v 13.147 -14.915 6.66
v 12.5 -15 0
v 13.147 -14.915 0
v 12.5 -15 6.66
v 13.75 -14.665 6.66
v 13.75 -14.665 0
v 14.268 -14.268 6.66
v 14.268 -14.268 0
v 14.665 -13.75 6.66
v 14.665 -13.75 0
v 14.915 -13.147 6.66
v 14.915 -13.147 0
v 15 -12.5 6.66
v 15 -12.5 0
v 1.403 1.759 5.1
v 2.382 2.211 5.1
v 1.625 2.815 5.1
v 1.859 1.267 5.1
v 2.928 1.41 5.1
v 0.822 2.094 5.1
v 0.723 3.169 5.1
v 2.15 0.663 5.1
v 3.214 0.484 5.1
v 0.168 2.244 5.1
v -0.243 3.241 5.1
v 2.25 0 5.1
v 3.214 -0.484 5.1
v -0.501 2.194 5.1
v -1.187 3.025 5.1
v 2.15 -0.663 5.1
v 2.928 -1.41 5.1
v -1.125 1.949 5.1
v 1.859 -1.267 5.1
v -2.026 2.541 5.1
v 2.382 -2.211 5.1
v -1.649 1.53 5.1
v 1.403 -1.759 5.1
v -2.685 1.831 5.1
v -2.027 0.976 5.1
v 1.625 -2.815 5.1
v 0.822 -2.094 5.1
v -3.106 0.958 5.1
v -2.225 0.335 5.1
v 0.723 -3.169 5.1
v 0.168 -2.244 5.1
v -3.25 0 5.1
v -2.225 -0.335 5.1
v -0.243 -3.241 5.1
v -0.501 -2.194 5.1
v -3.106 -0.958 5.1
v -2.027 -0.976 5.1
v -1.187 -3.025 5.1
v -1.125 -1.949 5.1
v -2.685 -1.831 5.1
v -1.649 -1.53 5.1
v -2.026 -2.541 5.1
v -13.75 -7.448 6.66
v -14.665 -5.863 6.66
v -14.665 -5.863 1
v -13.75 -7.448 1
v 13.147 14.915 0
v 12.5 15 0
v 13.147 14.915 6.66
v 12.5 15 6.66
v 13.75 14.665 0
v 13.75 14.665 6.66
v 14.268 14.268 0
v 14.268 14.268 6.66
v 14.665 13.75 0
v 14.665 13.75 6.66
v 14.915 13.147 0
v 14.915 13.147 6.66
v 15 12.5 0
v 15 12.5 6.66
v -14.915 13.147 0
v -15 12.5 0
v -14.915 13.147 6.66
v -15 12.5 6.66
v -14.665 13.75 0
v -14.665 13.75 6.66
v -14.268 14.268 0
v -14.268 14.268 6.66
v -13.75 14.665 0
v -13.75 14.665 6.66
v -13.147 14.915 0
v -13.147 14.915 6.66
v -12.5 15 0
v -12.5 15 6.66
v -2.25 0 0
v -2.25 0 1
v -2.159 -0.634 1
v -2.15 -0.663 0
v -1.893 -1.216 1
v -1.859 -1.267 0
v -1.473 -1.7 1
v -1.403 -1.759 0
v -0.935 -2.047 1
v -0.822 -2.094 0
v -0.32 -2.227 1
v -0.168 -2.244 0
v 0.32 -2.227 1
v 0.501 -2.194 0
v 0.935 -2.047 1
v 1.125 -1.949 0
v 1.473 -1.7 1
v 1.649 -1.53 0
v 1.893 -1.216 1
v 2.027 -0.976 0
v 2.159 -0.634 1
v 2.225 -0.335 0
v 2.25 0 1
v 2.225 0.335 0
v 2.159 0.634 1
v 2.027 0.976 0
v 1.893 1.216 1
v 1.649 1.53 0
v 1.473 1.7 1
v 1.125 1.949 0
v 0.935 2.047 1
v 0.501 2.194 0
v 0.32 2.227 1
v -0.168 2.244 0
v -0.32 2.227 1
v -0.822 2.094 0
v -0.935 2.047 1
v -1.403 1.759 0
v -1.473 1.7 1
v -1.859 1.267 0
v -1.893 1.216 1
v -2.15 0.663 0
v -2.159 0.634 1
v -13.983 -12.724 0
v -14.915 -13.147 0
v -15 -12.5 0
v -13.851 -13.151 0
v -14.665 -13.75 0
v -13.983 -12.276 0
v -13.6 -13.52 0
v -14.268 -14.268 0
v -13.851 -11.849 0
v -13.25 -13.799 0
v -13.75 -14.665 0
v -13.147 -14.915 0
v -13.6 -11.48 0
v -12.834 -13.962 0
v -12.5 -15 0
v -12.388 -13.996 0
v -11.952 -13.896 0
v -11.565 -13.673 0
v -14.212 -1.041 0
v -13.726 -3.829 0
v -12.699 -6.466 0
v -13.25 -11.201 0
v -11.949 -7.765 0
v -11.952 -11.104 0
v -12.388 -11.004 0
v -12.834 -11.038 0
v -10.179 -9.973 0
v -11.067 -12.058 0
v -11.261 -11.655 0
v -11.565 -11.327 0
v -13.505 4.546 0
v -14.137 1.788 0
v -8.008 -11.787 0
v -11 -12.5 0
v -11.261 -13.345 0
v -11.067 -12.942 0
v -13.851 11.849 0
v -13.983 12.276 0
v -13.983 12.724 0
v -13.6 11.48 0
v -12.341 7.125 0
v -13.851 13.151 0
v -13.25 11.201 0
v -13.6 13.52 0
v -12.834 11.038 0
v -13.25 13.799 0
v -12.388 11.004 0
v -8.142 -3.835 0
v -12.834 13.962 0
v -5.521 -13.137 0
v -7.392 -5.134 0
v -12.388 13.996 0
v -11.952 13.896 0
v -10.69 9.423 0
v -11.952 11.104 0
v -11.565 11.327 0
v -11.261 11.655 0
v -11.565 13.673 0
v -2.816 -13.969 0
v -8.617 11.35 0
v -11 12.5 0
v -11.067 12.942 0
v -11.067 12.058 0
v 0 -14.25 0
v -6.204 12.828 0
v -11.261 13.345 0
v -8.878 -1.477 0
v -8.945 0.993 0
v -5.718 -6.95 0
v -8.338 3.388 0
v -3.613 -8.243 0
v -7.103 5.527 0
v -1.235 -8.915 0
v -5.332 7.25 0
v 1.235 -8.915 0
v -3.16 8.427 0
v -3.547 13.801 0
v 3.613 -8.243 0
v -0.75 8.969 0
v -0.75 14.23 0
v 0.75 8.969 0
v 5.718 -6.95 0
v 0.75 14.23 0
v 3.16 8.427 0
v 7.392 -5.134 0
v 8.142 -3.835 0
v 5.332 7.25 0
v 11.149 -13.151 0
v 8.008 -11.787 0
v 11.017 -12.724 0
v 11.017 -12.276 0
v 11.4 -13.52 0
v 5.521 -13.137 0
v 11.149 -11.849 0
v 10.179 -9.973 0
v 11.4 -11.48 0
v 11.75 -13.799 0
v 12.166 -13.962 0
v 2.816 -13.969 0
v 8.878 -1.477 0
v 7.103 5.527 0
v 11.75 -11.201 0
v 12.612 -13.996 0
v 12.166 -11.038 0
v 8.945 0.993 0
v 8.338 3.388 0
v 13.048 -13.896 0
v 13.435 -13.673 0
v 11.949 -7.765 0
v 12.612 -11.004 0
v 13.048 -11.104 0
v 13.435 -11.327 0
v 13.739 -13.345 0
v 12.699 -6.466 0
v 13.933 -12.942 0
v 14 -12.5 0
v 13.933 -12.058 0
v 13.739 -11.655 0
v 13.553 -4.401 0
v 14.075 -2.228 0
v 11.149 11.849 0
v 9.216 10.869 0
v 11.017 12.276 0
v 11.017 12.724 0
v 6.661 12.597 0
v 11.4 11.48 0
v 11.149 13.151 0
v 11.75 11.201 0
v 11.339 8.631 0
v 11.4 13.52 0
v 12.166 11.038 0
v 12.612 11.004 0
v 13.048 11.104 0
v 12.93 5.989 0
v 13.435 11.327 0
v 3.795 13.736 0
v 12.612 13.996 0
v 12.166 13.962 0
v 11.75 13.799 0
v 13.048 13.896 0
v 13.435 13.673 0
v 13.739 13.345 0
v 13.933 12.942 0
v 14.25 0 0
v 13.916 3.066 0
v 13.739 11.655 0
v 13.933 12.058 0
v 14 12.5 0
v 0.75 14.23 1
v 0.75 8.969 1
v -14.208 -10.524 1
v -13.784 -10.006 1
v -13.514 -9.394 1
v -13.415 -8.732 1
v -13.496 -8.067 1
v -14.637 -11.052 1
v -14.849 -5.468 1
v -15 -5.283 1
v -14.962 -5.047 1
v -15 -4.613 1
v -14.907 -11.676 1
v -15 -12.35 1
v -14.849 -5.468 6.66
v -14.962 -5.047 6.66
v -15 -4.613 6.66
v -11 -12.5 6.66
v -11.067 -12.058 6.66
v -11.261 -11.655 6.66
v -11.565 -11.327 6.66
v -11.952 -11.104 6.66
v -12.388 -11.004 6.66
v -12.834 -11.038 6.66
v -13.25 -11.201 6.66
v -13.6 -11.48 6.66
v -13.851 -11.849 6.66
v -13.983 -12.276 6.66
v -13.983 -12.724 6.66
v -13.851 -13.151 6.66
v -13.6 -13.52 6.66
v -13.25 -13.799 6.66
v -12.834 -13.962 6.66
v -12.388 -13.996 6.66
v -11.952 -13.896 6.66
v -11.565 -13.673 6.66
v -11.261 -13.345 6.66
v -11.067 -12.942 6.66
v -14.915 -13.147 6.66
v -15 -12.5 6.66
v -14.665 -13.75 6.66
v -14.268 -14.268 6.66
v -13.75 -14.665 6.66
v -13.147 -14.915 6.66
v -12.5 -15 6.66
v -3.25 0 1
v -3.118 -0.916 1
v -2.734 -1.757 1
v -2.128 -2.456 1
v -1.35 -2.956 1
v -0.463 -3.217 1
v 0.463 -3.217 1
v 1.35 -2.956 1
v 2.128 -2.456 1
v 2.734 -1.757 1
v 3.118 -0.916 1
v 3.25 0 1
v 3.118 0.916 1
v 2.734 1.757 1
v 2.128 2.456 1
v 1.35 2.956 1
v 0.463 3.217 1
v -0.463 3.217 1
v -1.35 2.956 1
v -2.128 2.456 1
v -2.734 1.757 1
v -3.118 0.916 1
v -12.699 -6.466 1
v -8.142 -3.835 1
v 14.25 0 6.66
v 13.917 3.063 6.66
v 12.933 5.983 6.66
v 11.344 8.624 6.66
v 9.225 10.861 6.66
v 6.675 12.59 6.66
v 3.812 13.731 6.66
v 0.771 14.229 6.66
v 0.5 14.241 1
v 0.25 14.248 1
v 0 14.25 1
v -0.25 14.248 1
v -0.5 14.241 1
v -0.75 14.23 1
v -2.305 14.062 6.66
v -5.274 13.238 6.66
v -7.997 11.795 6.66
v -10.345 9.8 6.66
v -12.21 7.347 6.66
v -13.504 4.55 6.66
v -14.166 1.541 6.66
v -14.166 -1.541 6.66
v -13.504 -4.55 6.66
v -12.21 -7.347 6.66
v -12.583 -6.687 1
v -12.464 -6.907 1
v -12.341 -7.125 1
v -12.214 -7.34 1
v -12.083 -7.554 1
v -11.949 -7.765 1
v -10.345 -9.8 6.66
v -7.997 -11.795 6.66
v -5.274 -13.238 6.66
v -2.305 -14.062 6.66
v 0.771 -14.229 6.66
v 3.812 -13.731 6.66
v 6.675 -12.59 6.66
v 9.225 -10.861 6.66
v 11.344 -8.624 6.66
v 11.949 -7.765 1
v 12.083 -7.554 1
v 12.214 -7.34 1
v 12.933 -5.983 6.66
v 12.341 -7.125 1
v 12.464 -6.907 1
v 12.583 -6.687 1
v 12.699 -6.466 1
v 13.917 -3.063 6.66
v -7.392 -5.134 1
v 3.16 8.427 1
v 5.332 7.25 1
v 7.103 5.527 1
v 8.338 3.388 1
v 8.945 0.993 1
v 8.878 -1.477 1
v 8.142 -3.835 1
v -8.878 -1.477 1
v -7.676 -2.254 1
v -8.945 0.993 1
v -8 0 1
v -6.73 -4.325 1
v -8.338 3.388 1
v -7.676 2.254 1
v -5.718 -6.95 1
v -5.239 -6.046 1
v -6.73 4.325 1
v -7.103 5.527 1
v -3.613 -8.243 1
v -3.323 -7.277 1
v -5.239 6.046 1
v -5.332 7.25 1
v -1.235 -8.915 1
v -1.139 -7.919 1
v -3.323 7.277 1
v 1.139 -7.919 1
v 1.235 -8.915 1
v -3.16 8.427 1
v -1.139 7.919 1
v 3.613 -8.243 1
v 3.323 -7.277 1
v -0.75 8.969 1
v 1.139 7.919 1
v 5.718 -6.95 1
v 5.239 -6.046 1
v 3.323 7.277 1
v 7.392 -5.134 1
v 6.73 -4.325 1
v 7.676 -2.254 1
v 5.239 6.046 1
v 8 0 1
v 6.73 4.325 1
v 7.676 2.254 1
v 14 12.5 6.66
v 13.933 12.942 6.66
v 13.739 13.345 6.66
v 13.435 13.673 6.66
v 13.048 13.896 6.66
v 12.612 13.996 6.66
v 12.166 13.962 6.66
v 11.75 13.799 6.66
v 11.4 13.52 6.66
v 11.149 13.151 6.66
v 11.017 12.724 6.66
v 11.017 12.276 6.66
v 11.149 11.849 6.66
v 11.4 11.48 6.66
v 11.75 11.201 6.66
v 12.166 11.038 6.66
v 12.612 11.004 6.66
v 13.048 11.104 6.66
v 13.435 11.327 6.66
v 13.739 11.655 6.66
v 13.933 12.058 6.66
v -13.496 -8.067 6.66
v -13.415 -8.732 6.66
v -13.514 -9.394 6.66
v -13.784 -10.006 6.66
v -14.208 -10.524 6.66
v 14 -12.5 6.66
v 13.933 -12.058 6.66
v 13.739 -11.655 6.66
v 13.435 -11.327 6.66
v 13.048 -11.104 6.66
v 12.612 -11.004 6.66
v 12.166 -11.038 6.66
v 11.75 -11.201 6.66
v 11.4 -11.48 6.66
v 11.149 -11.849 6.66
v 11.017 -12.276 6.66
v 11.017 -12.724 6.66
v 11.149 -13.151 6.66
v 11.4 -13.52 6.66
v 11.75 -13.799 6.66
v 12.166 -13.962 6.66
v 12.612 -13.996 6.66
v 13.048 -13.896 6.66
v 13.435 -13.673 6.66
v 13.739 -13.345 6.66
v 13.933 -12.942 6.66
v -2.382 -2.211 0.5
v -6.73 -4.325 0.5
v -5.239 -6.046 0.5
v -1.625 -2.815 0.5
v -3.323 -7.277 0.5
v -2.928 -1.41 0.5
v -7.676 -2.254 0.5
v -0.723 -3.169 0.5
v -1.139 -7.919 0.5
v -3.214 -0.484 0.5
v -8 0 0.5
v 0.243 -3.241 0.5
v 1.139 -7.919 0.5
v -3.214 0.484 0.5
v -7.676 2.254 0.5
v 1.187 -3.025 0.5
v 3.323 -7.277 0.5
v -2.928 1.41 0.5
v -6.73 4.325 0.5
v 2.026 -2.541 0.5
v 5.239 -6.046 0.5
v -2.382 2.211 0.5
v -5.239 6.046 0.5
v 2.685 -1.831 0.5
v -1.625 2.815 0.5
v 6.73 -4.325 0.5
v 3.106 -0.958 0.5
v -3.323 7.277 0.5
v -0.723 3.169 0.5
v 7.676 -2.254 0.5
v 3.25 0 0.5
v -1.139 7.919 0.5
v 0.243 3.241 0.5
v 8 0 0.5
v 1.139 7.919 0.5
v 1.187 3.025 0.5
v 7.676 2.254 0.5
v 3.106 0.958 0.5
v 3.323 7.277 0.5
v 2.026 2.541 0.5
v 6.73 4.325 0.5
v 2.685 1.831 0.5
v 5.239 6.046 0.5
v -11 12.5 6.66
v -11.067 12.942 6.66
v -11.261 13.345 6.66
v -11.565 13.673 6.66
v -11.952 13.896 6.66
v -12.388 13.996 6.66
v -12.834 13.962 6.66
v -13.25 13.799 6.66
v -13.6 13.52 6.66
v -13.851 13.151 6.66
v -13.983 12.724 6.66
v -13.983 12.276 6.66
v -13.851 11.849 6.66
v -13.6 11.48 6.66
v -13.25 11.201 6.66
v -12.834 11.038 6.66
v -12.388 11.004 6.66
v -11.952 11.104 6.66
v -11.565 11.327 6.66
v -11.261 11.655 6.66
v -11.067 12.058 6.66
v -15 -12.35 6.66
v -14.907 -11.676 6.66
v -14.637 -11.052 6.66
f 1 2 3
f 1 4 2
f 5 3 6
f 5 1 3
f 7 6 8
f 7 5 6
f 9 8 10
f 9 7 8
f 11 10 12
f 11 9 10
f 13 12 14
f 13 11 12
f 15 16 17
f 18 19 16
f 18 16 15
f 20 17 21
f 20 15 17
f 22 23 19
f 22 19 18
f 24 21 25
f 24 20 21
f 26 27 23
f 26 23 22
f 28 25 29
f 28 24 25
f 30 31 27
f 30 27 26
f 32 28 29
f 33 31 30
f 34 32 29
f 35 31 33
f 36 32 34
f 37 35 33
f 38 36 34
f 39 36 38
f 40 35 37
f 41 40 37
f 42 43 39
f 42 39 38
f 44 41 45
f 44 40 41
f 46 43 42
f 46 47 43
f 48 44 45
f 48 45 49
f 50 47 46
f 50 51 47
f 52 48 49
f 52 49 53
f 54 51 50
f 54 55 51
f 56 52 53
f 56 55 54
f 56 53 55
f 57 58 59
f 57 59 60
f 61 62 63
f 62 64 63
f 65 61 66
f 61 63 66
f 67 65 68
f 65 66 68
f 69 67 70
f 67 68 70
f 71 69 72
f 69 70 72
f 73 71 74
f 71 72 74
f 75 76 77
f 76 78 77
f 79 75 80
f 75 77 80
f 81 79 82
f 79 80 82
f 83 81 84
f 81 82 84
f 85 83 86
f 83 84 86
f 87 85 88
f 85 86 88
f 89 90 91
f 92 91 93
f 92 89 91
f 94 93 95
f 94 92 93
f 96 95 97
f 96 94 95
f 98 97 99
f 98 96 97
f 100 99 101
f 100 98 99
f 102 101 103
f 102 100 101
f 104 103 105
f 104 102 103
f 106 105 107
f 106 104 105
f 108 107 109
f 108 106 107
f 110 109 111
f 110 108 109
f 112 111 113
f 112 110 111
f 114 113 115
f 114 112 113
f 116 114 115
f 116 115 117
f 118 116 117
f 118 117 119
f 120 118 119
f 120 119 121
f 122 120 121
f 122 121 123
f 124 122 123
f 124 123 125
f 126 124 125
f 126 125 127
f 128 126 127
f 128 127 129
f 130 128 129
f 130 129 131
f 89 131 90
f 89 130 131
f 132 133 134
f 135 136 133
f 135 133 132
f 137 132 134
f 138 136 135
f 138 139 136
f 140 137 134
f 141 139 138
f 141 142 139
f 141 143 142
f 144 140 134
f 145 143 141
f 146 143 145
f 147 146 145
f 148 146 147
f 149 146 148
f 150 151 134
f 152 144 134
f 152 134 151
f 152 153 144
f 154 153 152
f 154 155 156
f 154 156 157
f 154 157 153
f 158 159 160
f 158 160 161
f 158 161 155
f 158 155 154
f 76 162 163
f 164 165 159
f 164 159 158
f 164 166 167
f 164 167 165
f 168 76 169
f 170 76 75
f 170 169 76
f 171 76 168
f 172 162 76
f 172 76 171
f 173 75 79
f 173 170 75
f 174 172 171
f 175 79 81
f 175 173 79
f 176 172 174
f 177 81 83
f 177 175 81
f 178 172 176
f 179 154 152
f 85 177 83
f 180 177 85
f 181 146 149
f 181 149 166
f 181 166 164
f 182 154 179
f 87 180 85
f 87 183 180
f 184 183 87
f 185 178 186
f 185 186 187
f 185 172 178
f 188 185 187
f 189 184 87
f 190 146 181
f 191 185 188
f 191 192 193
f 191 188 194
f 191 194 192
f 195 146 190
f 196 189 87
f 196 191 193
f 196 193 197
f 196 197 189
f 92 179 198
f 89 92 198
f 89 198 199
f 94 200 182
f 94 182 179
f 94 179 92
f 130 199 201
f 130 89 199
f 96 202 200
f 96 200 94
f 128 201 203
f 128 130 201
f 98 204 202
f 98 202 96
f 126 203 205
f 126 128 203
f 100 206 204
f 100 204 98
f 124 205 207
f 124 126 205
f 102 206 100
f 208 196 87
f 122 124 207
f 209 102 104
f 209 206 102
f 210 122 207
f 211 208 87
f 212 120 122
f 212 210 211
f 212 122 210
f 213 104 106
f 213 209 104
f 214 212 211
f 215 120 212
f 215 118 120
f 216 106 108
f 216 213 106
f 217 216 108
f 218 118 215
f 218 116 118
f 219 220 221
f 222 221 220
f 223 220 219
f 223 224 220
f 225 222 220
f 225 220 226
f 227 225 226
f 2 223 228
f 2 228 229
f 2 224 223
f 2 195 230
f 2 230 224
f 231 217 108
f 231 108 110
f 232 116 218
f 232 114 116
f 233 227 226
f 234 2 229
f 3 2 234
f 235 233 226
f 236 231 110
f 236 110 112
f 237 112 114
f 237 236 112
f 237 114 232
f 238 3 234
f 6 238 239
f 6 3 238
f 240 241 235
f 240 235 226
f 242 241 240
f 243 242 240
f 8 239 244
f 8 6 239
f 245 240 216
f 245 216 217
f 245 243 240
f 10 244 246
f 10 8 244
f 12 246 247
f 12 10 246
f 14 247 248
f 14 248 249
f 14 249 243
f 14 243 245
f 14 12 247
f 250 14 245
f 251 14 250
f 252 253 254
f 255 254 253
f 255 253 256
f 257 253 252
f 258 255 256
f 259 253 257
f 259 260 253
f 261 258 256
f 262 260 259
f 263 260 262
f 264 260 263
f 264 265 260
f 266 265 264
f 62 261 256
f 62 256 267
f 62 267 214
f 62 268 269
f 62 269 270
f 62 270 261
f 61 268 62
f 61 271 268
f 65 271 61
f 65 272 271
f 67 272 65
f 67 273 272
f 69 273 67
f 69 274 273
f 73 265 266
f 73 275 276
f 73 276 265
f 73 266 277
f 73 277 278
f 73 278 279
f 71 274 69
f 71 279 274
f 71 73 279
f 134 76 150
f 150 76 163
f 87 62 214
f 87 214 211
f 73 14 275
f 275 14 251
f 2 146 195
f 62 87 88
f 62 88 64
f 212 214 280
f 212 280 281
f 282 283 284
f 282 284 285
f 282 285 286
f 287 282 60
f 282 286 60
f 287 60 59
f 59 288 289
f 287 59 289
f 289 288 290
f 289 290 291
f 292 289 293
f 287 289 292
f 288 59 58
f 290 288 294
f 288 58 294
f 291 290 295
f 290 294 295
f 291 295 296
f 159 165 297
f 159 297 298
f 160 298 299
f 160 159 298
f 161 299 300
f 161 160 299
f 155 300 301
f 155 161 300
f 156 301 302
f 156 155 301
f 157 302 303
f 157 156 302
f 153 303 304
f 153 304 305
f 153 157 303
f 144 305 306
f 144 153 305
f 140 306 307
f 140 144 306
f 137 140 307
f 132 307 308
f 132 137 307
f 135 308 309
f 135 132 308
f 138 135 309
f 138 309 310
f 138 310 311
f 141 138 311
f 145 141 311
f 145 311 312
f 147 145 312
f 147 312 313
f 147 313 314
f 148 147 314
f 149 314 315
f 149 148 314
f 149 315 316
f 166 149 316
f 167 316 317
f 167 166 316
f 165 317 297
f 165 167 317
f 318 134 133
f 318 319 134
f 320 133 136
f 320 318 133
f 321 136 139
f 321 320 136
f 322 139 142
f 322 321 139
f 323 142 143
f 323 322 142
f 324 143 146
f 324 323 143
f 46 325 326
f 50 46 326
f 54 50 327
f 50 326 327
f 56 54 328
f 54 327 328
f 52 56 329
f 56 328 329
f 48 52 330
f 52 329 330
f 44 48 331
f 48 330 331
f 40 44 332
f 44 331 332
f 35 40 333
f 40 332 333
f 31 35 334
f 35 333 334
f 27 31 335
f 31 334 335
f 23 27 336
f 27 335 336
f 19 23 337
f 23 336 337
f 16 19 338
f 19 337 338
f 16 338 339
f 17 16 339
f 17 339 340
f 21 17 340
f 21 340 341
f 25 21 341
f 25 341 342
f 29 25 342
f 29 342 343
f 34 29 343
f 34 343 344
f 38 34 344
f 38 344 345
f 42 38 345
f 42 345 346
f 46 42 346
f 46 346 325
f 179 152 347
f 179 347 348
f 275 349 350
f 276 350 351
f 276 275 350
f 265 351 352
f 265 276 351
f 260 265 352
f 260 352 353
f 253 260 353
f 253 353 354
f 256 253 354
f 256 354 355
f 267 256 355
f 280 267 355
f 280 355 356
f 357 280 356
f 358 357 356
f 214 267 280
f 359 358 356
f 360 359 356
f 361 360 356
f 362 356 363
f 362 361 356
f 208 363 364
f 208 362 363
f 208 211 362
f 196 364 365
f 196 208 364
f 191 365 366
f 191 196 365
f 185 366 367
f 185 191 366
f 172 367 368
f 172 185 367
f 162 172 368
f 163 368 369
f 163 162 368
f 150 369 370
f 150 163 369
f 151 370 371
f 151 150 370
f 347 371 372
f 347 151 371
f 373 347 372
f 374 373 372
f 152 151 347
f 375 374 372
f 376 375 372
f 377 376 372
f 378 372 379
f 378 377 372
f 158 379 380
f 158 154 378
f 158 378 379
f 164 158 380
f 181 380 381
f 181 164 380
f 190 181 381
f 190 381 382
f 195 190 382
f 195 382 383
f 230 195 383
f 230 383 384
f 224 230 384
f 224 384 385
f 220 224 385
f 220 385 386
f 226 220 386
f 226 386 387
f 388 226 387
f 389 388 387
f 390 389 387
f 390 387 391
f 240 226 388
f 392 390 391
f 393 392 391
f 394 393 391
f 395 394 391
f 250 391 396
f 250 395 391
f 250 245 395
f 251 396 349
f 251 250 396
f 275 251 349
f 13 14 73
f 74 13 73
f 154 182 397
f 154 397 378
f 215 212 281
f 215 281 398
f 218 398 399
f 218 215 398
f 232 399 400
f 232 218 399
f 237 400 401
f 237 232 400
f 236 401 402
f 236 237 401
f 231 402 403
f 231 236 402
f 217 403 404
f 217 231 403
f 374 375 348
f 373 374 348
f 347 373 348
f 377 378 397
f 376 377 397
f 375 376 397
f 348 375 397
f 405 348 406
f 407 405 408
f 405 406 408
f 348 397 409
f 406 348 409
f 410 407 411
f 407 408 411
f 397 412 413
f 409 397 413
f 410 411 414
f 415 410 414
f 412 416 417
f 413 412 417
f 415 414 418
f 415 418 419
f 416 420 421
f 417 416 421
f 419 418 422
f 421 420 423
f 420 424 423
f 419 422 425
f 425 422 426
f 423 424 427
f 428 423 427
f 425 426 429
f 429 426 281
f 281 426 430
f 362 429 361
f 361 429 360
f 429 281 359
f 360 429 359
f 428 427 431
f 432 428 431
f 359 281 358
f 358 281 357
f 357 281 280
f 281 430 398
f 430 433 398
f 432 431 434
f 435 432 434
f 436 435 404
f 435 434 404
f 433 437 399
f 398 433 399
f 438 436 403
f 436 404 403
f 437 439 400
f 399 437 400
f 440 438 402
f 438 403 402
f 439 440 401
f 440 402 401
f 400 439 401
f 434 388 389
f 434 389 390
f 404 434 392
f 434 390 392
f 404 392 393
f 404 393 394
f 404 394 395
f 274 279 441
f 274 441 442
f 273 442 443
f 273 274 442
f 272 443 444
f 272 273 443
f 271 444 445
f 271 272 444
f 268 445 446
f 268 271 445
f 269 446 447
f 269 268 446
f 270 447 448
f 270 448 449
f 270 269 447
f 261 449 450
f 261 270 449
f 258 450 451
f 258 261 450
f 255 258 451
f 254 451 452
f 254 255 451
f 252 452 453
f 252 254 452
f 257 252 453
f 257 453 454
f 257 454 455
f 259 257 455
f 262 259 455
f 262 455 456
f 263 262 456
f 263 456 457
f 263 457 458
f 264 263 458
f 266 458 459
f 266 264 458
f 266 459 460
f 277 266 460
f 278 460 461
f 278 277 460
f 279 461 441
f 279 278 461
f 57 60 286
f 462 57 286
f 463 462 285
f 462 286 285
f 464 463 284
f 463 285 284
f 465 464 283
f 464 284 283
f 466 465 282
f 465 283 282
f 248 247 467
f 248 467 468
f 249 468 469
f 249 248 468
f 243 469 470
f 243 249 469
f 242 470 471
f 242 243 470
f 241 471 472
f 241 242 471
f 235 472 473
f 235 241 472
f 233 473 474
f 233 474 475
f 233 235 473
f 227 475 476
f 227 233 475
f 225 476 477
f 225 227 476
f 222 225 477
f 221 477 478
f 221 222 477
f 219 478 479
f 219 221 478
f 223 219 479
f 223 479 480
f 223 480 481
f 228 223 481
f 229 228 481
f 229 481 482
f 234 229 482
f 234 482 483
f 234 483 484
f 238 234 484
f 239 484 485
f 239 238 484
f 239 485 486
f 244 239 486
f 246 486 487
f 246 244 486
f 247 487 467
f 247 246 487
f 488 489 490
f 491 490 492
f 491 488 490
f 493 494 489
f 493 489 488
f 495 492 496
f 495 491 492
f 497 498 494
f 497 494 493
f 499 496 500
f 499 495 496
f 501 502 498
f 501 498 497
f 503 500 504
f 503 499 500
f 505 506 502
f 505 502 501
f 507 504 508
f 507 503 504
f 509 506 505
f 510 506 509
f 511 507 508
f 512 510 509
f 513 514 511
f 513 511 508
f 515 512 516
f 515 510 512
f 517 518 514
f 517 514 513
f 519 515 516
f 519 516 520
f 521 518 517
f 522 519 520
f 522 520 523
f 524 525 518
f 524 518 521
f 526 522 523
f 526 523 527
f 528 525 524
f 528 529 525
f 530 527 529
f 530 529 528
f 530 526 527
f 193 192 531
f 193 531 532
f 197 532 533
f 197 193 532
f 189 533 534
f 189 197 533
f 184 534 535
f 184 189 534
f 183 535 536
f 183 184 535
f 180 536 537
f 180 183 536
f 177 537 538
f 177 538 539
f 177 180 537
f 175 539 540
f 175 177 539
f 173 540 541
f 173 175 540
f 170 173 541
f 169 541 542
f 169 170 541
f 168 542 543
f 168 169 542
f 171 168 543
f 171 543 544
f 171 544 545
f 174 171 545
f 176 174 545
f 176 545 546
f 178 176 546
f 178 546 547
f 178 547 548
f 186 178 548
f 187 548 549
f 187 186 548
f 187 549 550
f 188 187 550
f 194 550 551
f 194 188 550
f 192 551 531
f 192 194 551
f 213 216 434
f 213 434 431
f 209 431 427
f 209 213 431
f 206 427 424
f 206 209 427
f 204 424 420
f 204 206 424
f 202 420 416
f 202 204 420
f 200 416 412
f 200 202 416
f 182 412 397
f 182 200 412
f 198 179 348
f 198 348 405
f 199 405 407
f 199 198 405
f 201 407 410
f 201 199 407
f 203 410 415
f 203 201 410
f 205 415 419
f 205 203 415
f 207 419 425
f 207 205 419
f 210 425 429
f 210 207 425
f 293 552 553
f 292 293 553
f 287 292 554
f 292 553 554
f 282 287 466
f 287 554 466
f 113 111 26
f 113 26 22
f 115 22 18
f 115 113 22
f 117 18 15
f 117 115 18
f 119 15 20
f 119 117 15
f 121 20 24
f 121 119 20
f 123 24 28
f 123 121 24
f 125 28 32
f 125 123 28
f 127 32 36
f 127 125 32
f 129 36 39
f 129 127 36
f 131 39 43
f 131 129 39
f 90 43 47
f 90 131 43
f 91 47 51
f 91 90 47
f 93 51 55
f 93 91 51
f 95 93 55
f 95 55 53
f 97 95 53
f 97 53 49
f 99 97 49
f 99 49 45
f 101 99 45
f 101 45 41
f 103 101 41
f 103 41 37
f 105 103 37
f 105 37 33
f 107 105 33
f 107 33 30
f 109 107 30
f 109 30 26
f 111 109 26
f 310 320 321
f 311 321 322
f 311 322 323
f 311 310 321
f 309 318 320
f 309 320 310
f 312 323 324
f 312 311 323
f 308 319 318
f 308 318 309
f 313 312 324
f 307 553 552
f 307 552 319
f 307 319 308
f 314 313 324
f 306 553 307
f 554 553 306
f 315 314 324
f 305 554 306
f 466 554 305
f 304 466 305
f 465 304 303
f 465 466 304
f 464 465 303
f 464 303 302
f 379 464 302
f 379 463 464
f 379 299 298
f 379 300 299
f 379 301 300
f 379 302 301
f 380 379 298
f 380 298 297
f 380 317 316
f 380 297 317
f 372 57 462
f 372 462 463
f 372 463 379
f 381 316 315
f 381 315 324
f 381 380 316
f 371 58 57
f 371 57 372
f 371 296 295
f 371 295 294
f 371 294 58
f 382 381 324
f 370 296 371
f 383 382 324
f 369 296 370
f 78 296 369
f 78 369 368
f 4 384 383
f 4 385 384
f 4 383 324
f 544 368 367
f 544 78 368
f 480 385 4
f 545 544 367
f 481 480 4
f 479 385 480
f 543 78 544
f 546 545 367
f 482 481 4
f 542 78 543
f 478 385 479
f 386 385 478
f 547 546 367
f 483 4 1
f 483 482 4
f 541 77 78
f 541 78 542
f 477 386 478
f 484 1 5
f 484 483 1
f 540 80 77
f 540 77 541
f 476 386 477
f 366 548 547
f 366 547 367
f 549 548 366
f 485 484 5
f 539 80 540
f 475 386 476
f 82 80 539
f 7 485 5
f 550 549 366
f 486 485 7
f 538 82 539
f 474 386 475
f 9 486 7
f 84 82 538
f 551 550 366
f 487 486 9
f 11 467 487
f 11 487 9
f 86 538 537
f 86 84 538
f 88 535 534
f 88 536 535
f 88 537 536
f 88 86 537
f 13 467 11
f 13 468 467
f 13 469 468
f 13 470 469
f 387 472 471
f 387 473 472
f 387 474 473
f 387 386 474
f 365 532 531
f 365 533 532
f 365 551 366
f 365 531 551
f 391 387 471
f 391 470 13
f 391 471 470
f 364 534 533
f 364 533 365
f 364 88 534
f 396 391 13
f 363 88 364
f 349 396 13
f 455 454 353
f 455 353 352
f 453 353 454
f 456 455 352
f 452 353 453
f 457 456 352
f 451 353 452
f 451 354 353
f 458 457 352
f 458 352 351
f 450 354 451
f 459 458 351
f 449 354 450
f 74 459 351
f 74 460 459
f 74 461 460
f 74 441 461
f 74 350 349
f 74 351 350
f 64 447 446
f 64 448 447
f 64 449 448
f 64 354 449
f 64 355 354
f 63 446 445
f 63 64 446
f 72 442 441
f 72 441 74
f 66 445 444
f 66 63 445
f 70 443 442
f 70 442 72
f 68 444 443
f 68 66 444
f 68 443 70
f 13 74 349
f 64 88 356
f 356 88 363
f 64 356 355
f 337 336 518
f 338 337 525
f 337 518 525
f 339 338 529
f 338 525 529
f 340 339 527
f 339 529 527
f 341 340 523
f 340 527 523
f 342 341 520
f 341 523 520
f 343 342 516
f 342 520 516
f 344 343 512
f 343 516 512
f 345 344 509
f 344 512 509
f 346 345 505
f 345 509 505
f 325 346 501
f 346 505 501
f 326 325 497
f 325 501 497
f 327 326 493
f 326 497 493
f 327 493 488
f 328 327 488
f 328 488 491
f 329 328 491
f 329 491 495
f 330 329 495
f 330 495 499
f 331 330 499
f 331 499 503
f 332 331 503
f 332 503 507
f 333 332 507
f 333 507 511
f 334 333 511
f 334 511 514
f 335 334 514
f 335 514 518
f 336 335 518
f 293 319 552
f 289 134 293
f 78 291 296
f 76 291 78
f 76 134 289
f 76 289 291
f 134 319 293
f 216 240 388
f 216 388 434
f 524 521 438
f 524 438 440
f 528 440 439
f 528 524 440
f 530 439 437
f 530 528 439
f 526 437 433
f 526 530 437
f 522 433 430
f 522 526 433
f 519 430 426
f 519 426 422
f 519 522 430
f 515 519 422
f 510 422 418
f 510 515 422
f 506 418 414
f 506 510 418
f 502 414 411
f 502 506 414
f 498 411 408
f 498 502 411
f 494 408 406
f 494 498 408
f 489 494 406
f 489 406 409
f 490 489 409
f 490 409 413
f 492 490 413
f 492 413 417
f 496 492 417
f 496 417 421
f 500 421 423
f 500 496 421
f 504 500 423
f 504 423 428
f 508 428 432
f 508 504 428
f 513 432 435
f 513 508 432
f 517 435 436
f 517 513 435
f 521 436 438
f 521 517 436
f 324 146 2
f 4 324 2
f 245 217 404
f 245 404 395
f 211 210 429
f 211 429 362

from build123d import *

# Parameters (mm, degrees)
SKETCH1_W           = 30
SKETCH1_H           = 30
SKETCH1_R           = 14.25
SKETCH1_R_2         = 1.5
BOSS_EXTRUDE1_DEPTH = 6.66
BOSS_EXTRUDE2_DEPTH = 1
CIRPATTERN7_COUNT   = 3
SKETCH3_R           = 2.25
CUT_EXTRUDE2_DEPTH  = 23.234108932
SKETCH4_R           = 3.25
SKETCH4_R_2         = 2.25
BOSS_EXTRUDE3_DEPTH = 4.1
FILLET1_R           = 2.5
CUT_EXTRUDE4_START  = -0.5
SKETCH6_R           = 8
SKETCH6_R_2         = 3.25
CUT_EXTRUDE4_DEPTH  = 0.5
CUT_EXTRUDE5_DEPTH  = 5.66
FILLET4_R           = 2.5
FILLET5_R           = 2.5


with BuildPart() as part:
    # Sketch1 → Boss-Extrude1 (new body)
    with BuildSketch(Plane.XY):
        Rectangle(SKETCH1_W, SKETCH1_H)
        Circle(SKETCH1_R, mode=Mode.SUBTRACT)
        with Locations((-12.5, 12.5)):
            Circle(SKETCH1_R_2, mode=Mode.SUBTRACT)
        with Locations((12.5, 12.5)):
            Circle(SKETCH1_R_2, mode=Mode.SUBTRACT)
        with Locations((12.5, -12.5)):
            Circle(SKETCH1_R_2, mode=Mode.SUBTRACT)
        with Locations((-12.5, -12.5)):
            Circle(SKETCH1_R_2, mode=Mode.SUBTRACT)
    extrude(amount=BOSS_EXTRUDE1_DEPTH)

    # Sketch2 → Boss-Extrude2 (add)
    with BuildSketch(Plane.XY):
        with BuildLine():
            Line((-0.75, 8.968695557), (-0.75, 14.230249471))
            ThreePointArc((-0.75, 14.230249471), (-0.375130005, 14.245061512), (0, 14.25))
            Line((0, 14.25), (0, 0))
            Line((0, 0), (-12.340862004, -7.125))
            ThreePointArc((-12.340862004, -7.125), (-12.52415015, -6.797658642), (-12.698757544, -6.465605683))
            Line((-12.698757544, -6.465605683), (-8.142118191, -3.834828726))
            ThreePointArc((-8.142118191, -3.834828726), (-7.794228634, 4.5), (-0.75, 8.968695557))
        make_face()
    boss_extrude2 = extrude(amount=BOSS_EXTRUDE2_DEPTH)

    # CirPattern7: Boss-Extrude2 ×3 about axis
    cirpattern7_axis = Axis((0, 0, 0), (0, 0, 1))
    for i in range(1, CIRPATTERN7_COUNT):
        add(boss_extrude2.rotate(cirpattern7_axis, i * 360 / CIRPATTERN7_COUNT))

    # Sketch3 → Cut-Extrude2 (cut, through all)
    with BuildSketch(Plane.XY):
        with Locations(Location((0, 0, 0), (0, 0, 180))):
            Circle(SKETCH3_R)
    extrude(amount=CUT_EXTRUDE2_DEPTH, mode=Mode.SUBTRACT)

    # Sketch4 → Boss-Extrude3 (add)
    with BuildSketch(Plane.XY.offset(1)):
        with Locations(Location((0, 0, 0), (0, 0, 180))):
            Circle(SKETCH4_R)
        Circle(SKETCH4_R_2, mode=Mode.SUBTRACT)
    extrude(amount=BOSS_EXTRUDE3_DEPTH)

    # Fillet1
    fillet1_edges = [part.edges().sort_by_distance(p)[0] for p in [
        (15, -15, 3.33),
        (-15, -15, 3.33),
        (-15, 15, 3.33),
        (15, 15, 3.33),
    ]]
    fillet(fillet1_edges, radius=FILLET1_R)

    # Sketch6 → Cut-Extrude4 (cut)
    with BuildSketch(Plane.XY.offset(1).offset(CUT_EXTRUDE4_START)):
        Circle(SKETCH6_R)
        Circle(SKETCH6_R_2, mode=Mode.SUBTRACT)
    extrude(amount=CUT_EXTRUDE4_DEPTH, mode=Mode.SUBTRACT)

    # Sketch5 → Cut-Extrude5 (cut)
    with BuildSketch(Plane.XY.offset(6.66)):
        Polygon((-15, -5.283121635), (-12.5, -9.613248654), (-15, -11.056624327), align=None)
    extrude(amount=-CUT_EXTRUDE5_DEPTH, mode=Mode.SUBTRACT)

    # Fillet4
    fillet4_edges = [part.edges().sort_by_distance(p)[0] for p in [
        (-12.5, -9.613248654, 3.83),
    ]]
    fillet(fillet4_edges, radius=FILLET4_R)

    # Fillet5
    # the kernel refuses this fillet: 2.5 mm, written as the material it takes off along each edge
    with BuildSketch(Plane(origin=(-15, -11.056624327, 9.893983241), x_dir=(0, -1, 0), z_dir=(0, 0, -1))) as fillet5_piece_1:
        with BuildLine():
            CenterArc((1.293593296, -2.5), FILLET5_R, 90, 46.920482858)
            Line((-0.532422943, -0.792468245), (-0.715024567, -0.62171507))
            ThreePointArc((-0.715024567, -0.62171507), (-0.409882024, -0.209936491), (-0.216506351, 0.125))
            Line((-0.216506351, 0.125), (0, 0.25))
            Line((0, 0.25), (1.293593296, 0.25))
            Line((1.293593296, 0.25), (1.293593296, 0))
        make_face()
    extrude(amount=8.893983241, mode=Mode.SUBTRACT)
    with BuildSketch(Plane(origin=(-15, -5.283121635, 8.334682453), x_dir=(0.4999999999999945, -0.8660254037844419, 0), z_dir=(0, 0, -1))) as fillet5_piece_2:
        with BuildLine():
            CenterArc((FILLET5_R * 0.267949192431, -FILLET5_R), FILLET5_R, 90, 30)
            Line((-FILLET5_R * 0.232050807569, -FILLET5_R * 0.133974596216), (0, 0))
            Line((0, 0), (FILLET5_R * 0.267949192431, 0))
        make_face()
    extrude(amount=7.334682453, mode=Mode.SUBTRACT)


solid = part.part
